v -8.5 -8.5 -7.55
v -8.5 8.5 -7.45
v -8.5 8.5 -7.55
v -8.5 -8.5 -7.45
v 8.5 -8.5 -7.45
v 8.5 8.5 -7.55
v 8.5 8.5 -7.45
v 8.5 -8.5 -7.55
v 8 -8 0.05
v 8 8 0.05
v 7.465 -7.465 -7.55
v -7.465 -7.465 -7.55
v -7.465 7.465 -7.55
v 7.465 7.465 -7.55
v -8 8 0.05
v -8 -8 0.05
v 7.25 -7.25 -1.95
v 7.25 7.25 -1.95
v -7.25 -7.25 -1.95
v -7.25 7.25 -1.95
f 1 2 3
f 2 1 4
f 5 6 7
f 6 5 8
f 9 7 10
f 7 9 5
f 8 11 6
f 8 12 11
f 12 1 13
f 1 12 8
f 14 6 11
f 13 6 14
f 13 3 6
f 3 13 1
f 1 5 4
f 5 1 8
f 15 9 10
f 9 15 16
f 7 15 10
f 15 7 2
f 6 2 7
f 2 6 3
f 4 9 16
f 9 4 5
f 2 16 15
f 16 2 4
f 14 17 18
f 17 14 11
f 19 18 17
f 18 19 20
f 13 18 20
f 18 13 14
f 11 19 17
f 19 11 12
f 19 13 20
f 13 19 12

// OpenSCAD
/*
This module provides models of single Cherry profile keycaps
in R1 to R4 profile and sizes 1u, 1.25u, 1.5u, 1.75u, 2u, 2.25u, 2.75u and 6.25u

The actual models are taken from the ConstantinoSchillebeeckx/cherry-mx-keycaps repository
(https://github.com/ConstantinoSchillebeeckx/cherry-mx-keycaps/tree/thick-wall).
All credit for the models goes to the original author.
*/

//import("C:/Users/a_min/Ketron-EVM-Button-Controller/case/transparent_keycap_insert.stl");

//difference() {
//    cube([17,17,7.5], center = true);
//    color("red")
//        translate([0,0,-1])
//        cube([14.8,14.8,7.5], center = true);
//}


// A tapering cube using hull()
module tapered_cube(bottom_size, top_size, height) {
    hull() {
        // Bottom cube
        cube(bottom_size, center = true);

        // Top cube (translated up)
        translate([0, 0, height]) {
            cube(top_size, center = true);
        }
    }
}

// Example: Create a tapering cube with hull()
//tapered_cube(bottom_size = [40, 30, 0.1], top_size = [20, 15, 0.1], height = 20);
rotate([180,180,0])
    translate([0, 0, -7.5]) {

    difference() {
        // Example: Create a tapering cube with hull()
        tapered_cube(bottom_size = [17, 17, 0.1], top_size = [16, 16, 0.1], height = 7.5);

        color("red")
            translate([0, 0, -1])
            tapered_cube(bottom_size = [15, 15, 0.1], top_size = [14.5, 14.5, 0.1], height = 6.5);
    }
}
